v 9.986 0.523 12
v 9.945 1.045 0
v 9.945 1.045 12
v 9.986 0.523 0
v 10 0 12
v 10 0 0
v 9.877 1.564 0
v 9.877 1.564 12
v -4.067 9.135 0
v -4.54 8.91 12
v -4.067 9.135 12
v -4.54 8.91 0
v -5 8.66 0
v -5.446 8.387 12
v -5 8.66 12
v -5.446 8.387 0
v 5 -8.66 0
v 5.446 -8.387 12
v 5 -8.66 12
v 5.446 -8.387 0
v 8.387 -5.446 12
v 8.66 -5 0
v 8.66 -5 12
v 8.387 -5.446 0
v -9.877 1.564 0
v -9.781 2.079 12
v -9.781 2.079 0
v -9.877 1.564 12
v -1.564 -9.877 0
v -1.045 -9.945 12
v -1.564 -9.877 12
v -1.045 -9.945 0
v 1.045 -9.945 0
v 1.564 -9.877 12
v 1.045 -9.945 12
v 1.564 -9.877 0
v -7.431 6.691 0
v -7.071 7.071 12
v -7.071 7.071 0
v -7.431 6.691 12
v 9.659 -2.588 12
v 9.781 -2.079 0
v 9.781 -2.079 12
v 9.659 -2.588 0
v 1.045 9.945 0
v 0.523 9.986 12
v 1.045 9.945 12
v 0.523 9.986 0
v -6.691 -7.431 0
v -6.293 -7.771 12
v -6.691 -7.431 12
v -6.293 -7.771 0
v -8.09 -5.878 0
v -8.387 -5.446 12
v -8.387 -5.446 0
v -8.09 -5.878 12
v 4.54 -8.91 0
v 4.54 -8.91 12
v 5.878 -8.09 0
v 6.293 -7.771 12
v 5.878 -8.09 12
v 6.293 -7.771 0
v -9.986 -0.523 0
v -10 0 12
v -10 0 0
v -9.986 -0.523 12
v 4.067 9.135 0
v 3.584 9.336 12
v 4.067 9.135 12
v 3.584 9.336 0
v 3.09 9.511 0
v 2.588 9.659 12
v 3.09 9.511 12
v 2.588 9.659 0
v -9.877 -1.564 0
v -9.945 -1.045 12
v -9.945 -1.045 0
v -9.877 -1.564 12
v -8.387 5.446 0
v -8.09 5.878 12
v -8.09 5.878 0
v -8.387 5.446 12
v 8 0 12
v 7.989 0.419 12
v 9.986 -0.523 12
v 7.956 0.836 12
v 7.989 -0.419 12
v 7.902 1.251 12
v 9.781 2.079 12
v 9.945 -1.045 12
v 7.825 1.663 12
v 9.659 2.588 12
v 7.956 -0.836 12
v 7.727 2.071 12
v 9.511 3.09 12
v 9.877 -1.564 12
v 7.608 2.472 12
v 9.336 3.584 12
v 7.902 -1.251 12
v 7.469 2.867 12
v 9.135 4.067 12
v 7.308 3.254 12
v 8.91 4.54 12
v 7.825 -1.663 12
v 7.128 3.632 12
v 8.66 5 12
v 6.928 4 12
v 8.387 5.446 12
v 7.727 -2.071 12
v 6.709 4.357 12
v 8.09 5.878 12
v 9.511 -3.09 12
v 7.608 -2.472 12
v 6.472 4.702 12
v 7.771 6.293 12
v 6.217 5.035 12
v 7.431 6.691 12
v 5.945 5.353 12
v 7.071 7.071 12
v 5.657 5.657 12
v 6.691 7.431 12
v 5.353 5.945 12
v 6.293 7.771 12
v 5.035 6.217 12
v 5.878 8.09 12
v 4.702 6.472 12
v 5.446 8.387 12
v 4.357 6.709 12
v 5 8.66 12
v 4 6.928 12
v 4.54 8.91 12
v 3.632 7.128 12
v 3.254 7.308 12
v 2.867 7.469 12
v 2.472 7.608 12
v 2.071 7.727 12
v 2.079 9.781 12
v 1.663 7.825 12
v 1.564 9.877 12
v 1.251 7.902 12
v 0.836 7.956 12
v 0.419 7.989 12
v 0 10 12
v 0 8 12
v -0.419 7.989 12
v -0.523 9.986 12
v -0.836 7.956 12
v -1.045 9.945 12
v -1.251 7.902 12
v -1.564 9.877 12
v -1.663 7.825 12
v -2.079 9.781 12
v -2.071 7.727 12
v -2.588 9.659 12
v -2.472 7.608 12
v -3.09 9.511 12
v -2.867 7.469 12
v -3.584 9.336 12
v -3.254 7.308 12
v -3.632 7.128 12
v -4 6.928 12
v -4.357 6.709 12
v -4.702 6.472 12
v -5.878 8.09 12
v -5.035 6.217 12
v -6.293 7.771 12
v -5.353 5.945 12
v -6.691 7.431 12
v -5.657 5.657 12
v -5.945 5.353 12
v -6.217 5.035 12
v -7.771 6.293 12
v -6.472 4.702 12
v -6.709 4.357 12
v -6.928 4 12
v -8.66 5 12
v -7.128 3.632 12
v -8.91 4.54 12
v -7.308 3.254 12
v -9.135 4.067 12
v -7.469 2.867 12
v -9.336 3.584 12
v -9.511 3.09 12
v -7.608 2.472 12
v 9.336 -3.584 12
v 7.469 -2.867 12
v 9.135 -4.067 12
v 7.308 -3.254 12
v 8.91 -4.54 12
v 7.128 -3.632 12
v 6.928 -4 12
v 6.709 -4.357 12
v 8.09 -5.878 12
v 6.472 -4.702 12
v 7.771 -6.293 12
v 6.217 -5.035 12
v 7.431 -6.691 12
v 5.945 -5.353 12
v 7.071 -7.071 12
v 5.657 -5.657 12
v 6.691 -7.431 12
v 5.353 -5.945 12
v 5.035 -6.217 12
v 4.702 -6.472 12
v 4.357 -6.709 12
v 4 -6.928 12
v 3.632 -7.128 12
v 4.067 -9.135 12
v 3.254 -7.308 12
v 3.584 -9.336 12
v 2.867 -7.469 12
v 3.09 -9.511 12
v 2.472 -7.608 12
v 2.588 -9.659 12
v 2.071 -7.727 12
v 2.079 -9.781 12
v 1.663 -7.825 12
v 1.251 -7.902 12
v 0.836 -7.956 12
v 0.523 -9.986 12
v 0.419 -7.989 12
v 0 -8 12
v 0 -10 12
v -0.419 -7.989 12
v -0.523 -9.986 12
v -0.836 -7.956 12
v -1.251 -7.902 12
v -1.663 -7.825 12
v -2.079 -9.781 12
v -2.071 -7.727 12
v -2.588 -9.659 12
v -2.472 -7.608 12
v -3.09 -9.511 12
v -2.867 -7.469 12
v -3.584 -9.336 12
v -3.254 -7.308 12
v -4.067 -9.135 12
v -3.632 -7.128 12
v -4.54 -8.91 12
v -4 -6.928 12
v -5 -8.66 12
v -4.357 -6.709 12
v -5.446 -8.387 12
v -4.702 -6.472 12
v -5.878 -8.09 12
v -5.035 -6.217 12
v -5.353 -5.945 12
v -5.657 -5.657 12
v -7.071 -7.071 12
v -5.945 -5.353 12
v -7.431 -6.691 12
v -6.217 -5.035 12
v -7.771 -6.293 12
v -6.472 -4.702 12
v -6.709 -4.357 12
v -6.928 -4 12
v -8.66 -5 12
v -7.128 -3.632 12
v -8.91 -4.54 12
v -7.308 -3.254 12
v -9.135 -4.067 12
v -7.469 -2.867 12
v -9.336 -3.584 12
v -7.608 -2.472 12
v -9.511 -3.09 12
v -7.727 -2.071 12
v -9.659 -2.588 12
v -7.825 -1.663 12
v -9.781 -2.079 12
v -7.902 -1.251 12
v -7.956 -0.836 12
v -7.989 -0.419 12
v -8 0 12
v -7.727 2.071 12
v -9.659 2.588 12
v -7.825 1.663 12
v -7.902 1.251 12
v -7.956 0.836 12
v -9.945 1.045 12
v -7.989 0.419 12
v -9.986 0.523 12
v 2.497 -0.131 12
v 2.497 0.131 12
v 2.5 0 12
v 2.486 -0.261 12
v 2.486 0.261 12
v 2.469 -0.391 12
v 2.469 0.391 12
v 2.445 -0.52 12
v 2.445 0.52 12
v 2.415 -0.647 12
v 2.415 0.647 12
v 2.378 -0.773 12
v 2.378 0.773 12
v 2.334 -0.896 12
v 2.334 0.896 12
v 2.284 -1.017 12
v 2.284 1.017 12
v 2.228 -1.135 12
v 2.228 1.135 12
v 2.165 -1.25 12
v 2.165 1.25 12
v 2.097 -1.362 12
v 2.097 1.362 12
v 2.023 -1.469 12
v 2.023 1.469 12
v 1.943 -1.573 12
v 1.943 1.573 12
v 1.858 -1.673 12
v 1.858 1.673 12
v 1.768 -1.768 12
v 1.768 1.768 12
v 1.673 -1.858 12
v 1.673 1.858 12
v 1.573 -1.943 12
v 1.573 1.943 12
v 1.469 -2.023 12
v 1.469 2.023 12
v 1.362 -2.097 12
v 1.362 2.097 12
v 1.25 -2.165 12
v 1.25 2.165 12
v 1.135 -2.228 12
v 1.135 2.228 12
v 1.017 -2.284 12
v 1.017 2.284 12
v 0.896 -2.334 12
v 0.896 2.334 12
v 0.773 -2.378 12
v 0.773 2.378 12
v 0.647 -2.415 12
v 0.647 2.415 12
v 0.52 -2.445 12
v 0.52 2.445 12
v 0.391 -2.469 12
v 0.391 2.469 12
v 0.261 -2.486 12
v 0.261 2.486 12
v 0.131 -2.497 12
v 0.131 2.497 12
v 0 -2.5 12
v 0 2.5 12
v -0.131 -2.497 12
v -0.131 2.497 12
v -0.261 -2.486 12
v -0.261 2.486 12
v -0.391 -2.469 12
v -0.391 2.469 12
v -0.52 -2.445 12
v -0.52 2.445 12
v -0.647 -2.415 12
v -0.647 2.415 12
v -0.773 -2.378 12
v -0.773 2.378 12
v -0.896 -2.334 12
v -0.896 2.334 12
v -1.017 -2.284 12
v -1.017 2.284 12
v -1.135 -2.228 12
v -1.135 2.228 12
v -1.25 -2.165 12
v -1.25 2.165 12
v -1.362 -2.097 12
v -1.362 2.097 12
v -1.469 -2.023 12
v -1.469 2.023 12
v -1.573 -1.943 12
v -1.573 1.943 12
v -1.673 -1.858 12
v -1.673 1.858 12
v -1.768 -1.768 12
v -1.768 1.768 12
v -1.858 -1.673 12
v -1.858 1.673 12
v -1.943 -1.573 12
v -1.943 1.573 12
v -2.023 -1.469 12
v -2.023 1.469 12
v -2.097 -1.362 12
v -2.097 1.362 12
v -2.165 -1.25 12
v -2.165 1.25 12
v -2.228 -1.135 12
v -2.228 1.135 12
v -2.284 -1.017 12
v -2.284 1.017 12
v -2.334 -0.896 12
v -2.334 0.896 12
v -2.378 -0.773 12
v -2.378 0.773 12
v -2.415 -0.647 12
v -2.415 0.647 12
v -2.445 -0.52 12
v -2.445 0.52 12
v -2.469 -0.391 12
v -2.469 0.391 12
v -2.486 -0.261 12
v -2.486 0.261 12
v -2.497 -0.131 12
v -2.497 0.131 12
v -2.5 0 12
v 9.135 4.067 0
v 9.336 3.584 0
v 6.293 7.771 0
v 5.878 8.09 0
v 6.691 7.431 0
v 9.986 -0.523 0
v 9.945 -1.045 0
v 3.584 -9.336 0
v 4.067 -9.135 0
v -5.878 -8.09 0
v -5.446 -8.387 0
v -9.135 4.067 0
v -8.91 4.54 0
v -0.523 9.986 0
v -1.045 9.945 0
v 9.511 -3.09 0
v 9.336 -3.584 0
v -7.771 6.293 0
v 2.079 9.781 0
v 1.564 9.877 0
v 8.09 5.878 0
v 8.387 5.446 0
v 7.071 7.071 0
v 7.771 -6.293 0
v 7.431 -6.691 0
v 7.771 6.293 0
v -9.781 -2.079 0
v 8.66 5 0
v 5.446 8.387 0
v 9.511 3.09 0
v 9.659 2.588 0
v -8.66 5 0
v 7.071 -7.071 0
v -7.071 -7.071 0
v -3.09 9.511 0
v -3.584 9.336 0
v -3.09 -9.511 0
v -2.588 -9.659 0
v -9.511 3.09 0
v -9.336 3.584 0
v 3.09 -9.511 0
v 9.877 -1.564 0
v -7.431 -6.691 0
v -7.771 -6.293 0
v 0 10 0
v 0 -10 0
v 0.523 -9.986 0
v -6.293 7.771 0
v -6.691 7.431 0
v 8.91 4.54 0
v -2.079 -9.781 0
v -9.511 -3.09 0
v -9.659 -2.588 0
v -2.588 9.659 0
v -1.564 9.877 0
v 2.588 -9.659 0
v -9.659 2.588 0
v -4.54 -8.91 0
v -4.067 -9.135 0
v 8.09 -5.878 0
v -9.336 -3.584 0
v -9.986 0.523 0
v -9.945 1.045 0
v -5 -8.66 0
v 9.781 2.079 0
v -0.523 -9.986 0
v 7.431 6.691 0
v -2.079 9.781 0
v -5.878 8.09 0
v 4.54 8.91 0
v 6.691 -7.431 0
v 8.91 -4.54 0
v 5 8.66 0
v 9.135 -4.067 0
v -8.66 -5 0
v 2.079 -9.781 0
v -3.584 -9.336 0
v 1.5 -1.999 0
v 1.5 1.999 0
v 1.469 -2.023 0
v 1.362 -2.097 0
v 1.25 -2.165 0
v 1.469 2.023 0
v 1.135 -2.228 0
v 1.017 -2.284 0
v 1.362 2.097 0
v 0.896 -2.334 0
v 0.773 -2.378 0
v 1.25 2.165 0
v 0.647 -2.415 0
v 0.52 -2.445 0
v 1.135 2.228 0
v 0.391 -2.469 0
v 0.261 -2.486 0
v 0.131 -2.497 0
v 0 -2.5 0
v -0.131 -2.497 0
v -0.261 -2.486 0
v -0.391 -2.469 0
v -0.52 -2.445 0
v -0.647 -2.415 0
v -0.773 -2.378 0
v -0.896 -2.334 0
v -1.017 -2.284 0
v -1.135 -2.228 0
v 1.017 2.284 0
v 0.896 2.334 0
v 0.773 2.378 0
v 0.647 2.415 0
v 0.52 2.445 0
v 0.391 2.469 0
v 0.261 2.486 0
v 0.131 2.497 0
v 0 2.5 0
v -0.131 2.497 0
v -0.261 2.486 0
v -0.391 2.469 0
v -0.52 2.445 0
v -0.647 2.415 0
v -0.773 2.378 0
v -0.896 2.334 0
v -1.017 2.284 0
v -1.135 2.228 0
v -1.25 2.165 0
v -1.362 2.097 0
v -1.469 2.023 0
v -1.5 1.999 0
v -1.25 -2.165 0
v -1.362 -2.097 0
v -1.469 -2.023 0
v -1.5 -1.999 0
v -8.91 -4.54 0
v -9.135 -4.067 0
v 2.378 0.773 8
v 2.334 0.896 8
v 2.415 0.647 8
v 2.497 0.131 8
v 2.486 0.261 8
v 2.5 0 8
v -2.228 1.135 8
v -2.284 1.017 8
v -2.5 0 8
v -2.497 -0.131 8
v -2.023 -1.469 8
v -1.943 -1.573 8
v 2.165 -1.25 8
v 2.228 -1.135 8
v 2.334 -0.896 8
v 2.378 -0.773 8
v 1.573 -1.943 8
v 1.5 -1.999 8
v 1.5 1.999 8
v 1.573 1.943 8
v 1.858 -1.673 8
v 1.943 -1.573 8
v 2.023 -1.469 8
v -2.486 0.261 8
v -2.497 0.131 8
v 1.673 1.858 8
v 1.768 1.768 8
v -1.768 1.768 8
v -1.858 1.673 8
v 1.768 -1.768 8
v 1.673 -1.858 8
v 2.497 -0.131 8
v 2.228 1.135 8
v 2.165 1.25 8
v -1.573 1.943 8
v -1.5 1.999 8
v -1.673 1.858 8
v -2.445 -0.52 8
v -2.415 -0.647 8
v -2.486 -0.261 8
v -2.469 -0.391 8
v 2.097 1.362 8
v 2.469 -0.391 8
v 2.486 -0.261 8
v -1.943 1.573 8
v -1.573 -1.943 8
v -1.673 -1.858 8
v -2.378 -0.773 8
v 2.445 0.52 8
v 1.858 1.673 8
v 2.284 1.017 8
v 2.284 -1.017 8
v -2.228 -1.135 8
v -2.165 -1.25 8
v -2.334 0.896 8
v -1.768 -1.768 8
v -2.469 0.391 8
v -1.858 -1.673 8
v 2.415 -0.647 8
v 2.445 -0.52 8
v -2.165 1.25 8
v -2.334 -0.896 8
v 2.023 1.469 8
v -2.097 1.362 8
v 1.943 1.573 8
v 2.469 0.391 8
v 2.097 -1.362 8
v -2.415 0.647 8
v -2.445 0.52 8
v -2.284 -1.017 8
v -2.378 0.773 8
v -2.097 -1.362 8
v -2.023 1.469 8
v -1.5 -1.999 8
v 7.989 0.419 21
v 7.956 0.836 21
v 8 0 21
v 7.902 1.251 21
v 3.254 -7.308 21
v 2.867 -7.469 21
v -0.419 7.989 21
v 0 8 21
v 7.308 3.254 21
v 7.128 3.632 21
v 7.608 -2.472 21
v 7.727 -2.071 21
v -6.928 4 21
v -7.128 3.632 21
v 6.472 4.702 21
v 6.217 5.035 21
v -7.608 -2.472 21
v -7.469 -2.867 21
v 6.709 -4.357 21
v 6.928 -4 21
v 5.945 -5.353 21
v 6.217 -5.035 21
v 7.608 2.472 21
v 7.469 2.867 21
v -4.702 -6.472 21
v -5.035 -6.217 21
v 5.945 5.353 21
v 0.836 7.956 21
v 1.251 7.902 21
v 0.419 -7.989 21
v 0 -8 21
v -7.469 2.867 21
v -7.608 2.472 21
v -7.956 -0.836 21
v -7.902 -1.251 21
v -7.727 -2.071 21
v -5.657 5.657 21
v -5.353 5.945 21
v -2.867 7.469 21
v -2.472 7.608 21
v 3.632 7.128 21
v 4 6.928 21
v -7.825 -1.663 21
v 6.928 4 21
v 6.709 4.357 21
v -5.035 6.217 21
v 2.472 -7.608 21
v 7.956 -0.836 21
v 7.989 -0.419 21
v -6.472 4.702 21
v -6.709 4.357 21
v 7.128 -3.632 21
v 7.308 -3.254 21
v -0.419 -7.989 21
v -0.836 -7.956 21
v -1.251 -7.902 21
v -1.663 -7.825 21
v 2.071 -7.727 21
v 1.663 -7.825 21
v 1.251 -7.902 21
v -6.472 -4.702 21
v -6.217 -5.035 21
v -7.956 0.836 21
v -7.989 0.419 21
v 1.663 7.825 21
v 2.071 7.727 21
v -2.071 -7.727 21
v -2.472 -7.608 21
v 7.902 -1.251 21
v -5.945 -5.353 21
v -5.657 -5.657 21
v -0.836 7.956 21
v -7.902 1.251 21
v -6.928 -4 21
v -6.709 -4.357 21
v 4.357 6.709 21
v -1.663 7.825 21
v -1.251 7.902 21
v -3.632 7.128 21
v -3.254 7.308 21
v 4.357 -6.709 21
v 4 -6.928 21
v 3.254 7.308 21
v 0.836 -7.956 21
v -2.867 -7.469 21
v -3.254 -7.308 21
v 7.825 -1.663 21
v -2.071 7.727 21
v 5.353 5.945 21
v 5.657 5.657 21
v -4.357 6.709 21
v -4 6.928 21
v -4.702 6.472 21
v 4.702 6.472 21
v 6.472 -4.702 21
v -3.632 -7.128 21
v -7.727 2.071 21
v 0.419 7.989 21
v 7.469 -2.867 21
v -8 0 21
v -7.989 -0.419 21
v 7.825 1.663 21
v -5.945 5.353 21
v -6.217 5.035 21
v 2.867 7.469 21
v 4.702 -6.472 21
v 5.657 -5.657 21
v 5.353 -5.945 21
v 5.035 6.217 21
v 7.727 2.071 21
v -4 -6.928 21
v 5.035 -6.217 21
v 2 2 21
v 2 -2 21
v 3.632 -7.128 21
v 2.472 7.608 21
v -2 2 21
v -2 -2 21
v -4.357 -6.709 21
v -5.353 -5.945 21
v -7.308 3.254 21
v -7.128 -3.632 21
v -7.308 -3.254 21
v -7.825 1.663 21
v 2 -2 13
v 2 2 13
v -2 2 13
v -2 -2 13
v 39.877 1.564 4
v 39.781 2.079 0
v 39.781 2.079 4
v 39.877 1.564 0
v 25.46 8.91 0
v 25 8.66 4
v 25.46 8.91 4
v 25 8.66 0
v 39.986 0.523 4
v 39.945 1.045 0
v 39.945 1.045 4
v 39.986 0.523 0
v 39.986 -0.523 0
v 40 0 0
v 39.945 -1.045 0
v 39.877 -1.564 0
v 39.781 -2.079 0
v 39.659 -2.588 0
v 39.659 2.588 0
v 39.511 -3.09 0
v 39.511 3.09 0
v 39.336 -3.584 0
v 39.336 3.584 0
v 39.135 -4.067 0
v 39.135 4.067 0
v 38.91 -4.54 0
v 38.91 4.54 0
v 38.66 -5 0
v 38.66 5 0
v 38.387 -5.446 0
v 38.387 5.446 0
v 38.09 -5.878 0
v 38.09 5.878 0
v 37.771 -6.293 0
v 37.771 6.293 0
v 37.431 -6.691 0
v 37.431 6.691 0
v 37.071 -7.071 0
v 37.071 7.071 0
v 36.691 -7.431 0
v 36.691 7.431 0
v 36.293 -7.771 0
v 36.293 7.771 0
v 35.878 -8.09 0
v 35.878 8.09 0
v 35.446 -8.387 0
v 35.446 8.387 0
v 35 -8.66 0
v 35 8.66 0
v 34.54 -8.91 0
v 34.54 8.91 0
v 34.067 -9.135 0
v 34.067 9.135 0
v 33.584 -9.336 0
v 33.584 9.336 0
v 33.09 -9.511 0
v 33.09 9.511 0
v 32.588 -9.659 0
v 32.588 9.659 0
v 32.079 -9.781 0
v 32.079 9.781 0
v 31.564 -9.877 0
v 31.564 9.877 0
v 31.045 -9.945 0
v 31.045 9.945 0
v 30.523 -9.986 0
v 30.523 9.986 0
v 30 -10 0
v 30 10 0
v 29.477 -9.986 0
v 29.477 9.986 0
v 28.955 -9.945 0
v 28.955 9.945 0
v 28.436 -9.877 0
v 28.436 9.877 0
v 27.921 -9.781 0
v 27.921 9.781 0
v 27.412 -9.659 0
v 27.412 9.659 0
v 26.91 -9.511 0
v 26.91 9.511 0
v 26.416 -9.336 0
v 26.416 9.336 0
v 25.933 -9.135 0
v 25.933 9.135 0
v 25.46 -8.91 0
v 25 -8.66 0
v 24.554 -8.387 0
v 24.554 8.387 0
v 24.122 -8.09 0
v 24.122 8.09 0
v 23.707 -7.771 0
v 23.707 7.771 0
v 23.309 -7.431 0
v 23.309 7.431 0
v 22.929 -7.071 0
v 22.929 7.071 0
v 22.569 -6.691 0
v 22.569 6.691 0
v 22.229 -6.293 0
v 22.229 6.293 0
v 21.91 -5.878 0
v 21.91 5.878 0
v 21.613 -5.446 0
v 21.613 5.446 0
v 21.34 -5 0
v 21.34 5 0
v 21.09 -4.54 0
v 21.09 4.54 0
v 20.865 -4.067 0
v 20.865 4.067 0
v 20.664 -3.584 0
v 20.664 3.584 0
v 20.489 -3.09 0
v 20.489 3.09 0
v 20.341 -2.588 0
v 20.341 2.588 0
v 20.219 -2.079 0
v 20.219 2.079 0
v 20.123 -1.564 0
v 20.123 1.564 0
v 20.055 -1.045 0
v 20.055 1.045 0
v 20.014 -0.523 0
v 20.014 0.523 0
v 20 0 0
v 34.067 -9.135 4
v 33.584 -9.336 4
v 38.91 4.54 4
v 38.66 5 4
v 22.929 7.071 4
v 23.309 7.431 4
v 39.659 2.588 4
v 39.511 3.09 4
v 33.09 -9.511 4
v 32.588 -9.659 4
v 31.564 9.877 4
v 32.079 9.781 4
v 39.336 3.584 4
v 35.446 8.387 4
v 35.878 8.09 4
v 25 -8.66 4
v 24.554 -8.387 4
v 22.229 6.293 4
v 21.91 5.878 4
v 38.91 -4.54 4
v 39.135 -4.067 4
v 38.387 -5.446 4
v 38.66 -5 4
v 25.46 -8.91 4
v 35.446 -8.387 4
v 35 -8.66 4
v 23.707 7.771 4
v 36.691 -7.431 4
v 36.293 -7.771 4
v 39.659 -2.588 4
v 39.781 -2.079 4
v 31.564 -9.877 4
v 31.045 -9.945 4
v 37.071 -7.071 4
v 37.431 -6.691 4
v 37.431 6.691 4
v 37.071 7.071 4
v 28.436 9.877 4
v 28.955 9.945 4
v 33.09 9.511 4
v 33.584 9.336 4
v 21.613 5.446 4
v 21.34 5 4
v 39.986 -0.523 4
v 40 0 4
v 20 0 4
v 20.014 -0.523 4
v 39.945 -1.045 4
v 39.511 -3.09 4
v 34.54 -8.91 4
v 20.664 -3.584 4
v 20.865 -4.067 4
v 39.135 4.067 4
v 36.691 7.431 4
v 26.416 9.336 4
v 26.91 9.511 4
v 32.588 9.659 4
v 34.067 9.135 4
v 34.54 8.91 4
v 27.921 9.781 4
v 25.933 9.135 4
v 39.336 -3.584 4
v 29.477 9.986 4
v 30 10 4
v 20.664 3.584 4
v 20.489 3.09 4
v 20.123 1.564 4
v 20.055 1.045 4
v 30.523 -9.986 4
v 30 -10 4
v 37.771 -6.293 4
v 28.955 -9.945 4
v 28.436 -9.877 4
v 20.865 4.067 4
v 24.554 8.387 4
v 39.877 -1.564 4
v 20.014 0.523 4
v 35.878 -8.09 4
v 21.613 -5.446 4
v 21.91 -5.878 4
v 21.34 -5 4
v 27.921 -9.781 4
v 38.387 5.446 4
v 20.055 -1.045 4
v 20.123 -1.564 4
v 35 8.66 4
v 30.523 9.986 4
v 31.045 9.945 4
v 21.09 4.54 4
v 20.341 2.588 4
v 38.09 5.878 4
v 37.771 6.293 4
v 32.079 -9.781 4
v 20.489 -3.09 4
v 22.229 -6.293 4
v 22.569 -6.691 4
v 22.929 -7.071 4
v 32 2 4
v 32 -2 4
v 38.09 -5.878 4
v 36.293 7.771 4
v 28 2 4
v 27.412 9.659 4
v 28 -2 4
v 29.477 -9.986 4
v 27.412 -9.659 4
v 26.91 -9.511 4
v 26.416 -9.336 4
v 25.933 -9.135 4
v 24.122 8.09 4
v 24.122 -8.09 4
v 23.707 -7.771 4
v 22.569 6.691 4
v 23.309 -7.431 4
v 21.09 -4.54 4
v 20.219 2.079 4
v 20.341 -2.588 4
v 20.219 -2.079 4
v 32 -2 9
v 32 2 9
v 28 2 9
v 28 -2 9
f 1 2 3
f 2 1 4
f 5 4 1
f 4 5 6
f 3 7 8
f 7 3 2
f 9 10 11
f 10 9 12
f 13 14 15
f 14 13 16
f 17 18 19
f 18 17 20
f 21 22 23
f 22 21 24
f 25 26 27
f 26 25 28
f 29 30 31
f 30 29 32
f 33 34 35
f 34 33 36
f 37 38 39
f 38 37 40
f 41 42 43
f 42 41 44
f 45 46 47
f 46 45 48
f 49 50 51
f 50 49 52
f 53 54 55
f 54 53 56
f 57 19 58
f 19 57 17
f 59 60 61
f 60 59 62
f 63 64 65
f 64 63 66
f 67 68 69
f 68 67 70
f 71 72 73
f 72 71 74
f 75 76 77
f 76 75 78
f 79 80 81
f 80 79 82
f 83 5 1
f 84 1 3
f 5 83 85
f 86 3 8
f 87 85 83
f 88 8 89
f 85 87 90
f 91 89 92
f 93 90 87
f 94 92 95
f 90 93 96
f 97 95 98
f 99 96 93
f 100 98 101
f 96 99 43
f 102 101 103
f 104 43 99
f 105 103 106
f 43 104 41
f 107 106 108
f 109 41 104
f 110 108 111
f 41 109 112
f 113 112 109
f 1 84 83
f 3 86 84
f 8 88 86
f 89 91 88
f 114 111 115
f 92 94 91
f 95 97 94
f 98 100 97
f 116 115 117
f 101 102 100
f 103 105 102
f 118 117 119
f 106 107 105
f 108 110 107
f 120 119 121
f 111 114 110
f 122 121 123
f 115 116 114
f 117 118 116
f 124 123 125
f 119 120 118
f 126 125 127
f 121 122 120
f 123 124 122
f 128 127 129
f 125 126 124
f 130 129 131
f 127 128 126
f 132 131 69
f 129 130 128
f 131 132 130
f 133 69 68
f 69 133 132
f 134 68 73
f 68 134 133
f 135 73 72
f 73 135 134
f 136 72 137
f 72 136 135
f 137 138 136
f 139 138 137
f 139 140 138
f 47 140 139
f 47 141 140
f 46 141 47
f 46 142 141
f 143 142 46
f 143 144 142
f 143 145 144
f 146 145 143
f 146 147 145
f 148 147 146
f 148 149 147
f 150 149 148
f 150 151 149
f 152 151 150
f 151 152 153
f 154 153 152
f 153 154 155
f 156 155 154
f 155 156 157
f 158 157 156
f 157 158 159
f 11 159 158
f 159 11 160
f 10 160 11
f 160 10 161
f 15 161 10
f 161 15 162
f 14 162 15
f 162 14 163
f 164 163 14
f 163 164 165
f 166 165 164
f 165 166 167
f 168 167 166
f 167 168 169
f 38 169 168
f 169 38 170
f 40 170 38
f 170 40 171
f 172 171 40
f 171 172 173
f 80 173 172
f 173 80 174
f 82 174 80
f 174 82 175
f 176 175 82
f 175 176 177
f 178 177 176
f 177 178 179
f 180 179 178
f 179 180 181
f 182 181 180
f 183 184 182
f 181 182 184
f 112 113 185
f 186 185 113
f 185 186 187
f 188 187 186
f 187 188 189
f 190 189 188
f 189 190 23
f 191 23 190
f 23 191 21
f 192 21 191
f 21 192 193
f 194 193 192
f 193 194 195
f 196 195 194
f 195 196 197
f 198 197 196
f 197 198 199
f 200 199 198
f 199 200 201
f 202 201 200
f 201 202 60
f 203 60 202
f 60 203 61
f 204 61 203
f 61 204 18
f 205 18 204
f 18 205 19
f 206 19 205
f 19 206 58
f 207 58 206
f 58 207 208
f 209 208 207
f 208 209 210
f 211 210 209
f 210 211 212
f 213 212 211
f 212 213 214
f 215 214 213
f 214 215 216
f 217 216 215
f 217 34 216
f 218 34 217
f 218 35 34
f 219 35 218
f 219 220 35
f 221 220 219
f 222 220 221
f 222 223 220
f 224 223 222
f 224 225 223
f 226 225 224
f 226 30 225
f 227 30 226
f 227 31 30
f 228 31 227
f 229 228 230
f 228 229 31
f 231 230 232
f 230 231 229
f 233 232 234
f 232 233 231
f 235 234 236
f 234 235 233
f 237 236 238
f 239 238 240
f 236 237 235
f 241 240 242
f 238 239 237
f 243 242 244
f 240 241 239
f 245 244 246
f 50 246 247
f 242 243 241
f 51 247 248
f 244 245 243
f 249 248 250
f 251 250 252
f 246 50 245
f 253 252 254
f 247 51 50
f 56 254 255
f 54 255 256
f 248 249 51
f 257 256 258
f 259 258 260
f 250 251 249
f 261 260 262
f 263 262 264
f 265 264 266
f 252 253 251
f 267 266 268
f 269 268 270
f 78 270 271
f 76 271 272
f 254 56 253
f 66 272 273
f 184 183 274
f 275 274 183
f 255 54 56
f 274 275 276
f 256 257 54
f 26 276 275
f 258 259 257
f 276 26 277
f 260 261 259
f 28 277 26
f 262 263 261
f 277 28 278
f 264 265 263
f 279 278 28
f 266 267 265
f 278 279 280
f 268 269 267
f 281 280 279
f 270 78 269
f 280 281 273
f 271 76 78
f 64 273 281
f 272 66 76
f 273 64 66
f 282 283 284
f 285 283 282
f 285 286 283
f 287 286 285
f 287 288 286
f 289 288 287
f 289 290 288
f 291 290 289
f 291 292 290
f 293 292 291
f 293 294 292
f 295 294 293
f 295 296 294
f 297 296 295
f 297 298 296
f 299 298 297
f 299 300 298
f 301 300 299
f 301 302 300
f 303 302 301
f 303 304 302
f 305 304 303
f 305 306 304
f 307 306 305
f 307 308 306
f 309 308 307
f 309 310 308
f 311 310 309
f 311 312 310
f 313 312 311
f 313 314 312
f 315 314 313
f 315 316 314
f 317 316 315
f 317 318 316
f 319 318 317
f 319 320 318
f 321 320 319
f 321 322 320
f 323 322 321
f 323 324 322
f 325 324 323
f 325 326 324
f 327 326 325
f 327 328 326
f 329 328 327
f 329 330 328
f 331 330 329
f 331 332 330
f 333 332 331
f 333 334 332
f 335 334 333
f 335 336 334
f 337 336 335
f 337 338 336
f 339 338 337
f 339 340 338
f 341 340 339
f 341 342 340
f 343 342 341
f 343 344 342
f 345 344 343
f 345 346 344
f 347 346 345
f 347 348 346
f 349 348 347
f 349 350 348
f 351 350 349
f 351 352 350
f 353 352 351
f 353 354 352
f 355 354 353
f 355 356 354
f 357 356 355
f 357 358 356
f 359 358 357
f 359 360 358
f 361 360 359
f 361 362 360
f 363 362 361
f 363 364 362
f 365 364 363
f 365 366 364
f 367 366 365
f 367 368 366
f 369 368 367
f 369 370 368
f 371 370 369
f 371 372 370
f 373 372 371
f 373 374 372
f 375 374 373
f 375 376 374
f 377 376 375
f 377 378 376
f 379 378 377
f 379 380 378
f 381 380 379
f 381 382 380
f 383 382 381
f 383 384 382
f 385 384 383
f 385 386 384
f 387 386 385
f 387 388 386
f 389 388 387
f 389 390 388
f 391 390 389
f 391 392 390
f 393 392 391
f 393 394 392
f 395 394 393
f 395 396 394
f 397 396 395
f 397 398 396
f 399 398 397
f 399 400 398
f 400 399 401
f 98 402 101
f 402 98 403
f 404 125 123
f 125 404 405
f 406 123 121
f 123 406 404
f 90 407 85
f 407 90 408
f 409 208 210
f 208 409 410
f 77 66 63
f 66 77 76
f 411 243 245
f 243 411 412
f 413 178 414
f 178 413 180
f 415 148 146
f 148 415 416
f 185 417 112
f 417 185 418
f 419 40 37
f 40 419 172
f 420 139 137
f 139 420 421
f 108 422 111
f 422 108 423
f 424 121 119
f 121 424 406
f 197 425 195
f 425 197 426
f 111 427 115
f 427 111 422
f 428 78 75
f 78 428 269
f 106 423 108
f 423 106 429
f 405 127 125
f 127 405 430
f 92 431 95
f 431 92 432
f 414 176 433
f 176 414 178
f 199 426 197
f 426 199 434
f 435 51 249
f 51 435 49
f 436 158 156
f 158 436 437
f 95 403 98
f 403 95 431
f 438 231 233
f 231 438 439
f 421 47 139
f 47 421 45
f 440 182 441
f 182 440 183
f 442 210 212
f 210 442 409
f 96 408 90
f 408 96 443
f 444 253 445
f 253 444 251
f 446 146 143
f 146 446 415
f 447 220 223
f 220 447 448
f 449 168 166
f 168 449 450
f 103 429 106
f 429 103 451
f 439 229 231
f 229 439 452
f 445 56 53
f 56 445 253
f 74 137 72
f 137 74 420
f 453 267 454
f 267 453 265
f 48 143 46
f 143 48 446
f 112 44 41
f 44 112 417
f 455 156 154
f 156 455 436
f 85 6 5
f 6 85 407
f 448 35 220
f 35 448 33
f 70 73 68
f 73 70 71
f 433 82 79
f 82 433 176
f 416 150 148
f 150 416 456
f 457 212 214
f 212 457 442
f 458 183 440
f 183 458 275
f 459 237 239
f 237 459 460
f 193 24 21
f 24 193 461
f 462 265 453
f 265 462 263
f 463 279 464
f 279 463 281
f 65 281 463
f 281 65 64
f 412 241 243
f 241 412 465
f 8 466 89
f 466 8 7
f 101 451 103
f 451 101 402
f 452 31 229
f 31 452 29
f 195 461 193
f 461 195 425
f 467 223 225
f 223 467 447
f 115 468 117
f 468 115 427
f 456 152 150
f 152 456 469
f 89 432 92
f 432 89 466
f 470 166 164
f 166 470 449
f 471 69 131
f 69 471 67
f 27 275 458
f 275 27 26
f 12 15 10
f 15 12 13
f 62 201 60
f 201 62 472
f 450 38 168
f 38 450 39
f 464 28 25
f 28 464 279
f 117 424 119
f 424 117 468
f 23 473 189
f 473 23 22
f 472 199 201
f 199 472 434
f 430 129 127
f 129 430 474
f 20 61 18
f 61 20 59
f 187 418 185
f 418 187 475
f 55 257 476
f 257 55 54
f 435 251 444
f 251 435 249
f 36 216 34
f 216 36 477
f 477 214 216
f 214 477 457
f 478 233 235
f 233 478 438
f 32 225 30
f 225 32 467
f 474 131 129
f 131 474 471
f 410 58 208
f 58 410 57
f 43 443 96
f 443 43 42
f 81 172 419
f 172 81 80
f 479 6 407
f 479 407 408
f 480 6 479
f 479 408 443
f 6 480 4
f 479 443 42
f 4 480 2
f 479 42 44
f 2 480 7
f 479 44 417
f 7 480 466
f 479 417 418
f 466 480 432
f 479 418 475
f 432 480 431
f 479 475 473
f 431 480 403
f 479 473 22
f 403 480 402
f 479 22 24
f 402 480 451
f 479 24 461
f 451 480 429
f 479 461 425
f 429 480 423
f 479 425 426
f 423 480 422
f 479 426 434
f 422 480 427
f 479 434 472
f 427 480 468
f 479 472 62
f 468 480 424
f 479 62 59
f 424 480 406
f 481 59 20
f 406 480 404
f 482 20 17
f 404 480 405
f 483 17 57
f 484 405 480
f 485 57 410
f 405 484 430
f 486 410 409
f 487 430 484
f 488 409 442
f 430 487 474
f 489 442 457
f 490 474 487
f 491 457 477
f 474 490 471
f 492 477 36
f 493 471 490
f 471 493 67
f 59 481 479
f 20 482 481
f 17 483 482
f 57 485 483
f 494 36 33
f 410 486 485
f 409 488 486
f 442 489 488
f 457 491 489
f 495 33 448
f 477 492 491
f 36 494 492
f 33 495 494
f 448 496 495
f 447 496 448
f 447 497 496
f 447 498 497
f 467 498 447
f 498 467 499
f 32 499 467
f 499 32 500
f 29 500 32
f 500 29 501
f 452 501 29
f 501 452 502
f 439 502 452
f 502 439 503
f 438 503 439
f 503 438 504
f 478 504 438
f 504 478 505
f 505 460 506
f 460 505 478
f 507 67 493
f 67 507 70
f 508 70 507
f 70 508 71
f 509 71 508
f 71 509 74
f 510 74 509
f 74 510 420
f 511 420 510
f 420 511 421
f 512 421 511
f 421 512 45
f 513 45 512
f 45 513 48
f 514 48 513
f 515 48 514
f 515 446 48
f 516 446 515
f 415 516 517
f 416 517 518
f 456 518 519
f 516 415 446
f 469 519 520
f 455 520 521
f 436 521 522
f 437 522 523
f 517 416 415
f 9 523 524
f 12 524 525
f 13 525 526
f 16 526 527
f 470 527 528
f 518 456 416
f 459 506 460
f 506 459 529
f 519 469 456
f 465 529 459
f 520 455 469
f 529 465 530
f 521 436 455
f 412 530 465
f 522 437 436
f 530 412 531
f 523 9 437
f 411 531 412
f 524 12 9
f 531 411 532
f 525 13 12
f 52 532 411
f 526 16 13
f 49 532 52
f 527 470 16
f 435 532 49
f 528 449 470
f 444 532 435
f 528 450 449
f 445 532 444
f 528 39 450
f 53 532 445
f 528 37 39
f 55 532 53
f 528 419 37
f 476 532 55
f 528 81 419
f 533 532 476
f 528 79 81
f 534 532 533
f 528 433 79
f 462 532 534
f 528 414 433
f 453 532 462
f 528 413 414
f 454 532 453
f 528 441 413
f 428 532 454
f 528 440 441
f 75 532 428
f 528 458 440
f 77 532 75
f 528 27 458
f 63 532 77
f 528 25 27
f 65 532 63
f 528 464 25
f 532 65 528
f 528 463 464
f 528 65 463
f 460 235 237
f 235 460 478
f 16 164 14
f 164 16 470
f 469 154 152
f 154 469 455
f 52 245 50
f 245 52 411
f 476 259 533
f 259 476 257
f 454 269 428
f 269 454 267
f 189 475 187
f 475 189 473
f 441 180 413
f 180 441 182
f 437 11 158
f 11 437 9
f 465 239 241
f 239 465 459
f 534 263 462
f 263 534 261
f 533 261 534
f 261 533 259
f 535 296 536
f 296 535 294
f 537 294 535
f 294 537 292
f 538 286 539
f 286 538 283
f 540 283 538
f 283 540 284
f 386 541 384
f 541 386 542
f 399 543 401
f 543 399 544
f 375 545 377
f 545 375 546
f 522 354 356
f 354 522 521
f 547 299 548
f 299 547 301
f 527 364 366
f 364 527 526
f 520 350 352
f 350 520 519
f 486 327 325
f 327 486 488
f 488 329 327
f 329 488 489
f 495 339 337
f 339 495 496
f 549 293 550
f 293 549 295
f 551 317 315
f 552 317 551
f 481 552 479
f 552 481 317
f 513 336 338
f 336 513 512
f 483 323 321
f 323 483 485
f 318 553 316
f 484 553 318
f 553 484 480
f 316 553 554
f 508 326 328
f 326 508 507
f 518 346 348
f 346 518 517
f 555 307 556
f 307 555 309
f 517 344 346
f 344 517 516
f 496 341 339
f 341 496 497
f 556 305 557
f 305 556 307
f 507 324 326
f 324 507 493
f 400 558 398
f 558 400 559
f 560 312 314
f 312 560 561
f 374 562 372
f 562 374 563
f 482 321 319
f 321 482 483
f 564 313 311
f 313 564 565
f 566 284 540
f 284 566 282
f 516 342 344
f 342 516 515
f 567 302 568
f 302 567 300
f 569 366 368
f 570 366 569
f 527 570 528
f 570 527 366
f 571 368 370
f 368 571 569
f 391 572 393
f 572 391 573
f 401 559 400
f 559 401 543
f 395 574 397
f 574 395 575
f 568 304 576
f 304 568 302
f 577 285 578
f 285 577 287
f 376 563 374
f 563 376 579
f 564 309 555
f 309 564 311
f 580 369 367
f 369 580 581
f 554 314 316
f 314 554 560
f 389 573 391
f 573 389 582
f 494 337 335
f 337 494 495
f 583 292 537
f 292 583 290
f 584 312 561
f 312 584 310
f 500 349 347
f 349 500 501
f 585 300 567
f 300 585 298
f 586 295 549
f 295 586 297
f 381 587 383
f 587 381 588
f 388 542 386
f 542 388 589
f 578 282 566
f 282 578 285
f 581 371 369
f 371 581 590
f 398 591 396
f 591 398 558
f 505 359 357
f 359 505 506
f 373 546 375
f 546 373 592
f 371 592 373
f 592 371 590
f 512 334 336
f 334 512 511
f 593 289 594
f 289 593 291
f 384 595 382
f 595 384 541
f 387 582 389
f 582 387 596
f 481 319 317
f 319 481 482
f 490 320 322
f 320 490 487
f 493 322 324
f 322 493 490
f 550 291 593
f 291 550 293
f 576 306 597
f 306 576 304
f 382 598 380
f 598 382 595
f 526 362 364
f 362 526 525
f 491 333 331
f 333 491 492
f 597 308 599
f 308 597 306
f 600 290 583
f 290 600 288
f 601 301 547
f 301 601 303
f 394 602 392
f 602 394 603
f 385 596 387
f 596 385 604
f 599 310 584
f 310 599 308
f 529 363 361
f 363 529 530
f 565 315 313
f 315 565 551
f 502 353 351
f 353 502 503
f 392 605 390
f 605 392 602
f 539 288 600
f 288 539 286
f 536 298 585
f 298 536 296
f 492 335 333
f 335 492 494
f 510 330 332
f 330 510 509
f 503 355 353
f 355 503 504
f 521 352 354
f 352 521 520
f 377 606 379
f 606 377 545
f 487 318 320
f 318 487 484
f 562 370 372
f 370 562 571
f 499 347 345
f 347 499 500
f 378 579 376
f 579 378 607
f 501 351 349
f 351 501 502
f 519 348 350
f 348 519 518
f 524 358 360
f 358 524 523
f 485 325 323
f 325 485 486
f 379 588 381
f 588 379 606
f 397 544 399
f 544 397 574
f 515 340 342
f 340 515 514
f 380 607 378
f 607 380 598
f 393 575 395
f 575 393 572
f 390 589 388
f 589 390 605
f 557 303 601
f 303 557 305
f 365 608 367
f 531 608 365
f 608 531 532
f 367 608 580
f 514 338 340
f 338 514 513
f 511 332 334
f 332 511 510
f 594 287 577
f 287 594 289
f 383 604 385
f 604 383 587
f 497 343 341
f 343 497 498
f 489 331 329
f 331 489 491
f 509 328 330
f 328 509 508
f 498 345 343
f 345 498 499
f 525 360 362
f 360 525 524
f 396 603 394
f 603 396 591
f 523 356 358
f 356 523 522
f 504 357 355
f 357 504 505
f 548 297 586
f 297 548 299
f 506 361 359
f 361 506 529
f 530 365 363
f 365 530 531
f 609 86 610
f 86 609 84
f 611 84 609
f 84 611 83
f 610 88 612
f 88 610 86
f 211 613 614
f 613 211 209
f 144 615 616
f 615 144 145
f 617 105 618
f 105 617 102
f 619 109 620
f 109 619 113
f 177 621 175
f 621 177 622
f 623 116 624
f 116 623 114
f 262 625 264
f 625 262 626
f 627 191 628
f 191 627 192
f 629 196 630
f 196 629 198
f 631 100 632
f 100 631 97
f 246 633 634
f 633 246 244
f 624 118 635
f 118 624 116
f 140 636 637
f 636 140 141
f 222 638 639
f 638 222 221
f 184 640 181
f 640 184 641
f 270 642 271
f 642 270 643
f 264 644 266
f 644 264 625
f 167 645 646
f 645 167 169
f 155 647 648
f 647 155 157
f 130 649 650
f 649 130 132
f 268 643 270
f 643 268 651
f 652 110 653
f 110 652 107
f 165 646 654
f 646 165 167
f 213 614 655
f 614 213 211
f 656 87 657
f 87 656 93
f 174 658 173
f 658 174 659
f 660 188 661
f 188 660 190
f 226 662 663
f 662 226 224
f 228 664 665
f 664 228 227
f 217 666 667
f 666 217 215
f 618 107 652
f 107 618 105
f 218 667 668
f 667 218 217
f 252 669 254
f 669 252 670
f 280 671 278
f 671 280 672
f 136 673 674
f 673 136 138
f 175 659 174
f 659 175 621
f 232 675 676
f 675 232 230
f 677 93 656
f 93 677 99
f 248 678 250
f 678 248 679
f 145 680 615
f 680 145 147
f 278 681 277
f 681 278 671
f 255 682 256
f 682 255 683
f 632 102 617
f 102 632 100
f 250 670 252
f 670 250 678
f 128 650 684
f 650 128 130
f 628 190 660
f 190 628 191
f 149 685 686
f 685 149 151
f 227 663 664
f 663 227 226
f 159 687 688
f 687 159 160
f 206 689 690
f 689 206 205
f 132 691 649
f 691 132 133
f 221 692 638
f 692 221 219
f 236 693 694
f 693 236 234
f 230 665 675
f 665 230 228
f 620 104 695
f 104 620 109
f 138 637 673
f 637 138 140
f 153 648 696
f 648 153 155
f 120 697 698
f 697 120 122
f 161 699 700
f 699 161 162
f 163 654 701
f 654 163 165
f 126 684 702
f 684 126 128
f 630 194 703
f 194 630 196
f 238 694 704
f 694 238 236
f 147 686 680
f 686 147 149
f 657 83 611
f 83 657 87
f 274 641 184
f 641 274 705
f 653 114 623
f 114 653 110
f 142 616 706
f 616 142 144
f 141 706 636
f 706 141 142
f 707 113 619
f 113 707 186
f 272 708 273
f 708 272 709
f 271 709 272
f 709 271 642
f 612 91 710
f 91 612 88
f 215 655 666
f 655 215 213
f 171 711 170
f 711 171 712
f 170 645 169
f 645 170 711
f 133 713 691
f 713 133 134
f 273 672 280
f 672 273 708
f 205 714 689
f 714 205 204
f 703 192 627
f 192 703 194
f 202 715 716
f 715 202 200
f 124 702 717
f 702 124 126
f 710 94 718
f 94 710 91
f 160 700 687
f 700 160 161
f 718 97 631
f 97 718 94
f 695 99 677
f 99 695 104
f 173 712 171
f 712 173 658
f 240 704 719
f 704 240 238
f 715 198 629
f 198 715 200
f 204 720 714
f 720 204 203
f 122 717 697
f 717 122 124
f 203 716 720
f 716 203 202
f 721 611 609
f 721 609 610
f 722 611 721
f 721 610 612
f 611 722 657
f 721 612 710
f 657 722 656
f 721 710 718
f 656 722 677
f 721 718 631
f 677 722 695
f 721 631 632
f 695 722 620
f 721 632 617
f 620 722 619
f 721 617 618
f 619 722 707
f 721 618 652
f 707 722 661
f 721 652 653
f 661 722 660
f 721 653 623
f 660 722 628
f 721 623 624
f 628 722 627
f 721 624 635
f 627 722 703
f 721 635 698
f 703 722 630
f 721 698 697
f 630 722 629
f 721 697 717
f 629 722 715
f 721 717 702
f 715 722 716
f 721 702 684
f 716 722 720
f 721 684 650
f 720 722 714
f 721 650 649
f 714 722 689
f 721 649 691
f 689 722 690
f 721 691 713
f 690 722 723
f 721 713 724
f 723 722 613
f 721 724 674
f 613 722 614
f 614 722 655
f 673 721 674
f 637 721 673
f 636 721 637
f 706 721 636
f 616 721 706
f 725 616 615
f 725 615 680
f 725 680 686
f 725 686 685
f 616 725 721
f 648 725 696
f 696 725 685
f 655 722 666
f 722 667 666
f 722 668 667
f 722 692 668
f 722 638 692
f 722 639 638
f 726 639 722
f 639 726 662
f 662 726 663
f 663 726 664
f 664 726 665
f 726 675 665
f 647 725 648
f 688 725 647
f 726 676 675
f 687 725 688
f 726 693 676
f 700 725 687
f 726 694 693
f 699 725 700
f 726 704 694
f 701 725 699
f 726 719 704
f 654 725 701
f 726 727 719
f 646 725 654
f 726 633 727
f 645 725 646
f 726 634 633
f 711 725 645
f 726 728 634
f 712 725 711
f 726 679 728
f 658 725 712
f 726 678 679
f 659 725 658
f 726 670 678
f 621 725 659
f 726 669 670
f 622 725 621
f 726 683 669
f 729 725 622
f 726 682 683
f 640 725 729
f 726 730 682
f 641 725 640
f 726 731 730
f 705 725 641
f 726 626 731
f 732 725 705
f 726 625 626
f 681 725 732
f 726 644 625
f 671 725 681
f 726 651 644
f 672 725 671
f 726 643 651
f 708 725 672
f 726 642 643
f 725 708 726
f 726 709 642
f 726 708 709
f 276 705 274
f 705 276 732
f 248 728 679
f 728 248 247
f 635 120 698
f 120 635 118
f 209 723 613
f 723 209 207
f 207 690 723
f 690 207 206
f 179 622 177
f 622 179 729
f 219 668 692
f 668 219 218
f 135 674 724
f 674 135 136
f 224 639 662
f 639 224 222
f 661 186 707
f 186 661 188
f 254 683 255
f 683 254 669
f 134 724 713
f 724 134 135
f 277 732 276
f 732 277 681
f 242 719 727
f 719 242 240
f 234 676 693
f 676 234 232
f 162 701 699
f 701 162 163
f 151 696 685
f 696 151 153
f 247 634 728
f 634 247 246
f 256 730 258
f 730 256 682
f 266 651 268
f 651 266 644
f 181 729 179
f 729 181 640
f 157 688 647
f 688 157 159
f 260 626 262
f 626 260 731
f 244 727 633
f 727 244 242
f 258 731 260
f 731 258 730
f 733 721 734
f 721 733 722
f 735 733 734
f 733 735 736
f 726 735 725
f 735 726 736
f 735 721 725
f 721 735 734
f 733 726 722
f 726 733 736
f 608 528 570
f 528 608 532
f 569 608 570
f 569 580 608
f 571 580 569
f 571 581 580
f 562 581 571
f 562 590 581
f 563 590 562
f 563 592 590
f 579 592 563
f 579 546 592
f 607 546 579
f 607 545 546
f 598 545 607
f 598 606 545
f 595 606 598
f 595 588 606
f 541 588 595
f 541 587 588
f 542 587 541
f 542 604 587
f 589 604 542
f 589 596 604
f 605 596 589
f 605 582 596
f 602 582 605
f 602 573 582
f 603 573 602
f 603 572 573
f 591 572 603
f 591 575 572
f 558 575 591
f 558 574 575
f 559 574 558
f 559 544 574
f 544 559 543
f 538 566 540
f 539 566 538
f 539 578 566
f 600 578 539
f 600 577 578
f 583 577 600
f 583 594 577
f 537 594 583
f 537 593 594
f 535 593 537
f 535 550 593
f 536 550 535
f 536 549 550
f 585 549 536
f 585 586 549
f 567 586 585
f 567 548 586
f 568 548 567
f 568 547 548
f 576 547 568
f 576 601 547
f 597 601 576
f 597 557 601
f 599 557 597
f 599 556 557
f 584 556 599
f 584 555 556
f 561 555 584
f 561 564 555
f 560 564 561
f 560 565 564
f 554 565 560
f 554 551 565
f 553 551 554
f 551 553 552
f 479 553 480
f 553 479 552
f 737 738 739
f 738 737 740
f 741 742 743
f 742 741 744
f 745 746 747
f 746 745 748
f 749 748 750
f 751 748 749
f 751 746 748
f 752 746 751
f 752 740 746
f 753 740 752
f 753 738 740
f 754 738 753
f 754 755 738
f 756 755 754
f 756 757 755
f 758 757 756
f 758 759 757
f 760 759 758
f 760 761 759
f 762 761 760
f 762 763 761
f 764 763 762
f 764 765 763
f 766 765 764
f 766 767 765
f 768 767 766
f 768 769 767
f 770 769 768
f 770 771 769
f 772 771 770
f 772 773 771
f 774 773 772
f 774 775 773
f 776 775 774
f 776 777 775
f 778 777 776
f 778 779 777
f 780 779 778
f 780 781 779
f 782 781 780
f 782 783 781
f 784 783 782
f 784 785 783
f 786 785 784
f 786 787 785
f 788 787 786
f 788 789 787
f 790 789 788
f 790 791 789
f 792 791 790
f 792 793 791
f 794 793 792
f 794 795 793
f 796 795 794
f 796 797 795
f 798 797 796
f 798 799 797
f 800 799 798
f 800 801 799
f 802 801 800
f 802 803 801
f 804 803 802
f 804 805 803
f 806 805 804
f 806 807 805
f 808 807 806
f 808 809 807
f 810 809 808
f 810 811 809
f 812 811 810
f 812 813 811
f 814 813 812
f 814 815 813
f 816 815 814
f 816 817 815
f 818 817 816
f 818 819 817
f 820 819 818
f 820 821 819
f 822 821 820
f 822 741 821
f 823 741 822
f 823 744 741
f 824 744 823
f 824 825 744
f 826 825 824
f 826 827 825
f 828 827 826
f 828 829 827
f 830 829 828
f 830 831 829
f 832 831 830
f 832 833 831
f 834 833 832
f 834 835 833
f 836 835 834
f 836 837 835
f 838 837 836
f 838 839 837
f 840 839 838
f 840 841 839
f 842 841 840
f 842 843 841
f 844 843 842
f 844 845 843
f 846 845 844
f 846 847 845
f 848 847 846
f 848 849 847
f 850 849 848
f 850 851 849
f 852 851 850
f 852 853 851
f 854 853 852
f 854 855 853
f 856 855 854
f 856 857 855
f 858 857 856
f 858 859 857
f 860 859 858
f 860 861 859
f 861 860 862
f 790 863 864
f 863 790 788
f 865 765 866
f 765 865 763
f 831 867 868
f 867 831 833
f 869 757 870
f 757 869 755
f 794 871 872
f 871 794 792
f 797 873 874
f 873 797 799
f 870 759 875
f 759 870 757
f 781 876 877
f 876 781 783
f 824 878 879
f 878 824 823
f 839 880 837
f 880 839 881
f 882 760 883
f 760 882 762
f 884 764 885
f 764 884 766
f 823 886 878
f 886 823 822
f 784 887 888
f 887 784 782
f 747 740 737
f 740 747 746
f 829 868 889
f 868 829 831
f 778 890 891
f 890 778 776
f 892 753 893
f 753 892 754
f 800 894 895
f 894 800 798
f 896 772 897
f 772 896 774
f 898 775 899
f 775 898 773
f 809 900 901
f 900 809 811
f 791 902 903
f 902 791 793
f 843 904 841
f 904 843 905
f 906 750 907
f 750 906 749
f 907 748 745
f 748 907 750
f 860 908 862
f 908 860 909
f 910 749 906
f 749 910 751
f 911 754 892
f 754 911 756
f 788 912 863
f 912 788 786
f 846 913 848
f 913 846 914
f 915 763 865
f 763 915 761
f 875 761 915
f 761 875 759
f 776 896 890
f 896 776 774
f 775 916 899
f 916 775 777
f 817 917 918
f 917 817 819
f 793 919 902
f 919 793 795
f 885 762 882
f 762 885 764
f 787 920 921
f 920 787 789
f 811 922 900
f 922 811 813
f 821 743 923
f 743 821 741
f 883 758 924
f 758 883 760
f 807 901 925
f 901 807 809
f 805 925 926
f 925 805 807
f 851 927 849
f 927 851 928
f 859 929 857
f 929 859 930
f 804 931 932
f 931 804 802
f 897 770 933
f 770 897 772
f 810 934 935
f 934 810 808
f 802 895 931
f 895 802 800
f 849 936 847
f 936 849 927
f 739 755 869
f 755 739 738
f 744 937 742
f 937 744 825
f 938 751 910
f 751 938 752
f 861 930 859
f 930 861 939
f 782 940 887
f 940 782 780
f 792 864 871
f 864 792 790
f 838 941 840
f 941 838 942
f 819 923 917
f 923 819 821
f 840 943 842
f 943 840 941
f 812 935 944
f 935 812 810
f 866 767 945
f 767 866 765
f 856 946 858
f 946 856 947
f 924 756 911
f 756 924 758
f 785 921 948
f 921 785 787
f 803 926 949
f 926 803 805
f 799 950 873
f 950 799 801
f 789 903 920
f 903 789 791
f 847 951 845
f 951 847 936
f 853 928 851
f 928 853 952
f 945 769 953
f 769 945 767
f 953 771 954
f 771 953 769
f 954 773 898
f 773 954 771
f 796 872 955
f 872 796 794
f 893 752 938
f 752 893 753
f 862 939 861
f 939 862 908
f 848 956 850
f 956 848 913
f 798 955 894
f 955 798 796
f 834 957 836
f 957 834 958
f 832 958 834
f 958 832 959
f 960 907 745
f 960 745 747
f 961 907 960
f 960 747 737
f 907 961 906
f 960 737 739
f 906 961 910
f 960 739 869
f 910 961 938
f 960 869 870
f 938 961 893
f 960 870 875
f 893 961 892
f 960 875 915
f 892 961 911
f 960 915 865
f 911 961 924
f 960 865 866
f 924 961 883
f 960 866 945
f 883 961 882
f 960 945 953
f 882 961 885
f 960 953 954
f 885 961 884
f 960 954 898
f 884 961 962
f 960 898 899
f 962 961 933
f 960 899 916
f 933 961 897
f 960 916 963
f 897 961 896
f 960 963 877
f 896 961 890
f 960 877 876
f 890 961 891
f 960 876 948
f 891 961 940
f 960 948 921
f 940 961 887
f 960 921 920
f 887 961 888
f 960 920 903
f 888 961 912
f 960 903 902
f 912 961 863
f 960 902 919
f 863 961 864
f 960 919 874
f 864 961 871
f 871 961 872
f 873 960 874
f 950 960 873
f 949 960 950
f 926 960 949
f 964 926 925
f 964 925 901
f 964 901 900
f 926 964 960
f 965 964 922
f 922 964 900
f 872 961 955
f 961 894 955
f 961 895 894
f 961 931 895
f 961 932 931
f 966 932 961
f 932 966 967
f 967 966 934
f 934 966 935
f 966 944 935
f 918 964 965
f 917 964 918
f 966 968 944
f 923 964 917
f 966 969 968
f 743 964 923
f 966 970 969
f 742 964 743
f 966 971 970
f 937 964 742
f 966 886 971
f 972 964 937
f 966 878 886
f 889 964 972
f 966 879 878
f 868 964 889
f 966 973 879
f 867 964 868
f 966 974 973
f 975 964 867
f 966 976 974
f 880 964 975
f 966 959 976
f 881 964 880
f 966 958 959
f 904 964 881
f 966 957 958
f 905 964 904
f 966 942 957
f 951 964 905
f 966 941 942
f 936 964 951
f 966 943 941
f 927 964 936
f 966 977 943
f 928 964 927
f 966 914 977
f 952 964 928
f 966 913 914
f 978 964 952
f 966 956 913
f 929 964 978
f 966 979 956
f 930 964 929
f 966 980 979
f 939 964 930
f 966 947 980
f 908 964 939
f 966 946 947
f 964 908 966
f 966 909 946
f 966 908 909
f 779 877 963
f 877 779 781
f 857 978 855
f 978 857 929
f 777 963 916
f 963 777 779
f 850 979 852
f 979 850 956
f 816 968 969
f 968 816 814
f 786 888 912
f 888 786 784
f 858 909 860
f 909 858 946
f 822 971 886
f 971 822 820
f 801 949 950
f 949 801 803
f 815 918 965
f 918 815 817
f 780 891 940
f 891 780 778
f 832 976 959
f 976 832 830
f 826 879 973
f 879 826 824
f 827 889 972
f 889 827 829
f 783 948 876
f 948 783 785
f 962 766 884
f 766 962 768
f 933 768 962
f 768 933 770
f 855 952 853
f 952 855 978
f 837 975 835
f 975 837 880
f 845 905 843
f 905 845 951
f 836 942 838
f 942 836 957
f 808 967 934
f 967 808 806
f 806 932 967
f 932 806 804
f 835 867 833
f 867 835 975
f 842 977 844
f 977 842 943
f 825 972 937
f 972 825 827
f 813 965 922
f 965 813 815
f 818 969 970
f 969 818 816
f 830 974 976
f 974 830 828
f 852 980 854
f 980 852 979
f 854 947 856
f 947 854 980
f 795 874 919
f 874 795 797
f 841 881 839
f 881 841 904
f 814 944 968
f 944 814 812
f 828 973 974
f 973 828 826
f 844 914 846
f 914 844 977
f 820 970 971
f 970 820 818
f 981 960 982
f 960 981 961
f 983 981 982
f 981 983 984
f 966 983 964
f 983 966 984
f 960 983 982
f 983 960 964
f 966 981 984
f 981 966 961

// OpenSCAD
$fn=120;
spindle_traction();
translate([30,0,0])
spindle_top();
module spindle_traction() {
        difference () {
            cylinder(d=20,h=12);
            cylinder(d=5,h=12);
        }
        translate([0,0,12])
        difference(){
            cylinder(d=16,h=9);
            translate([-2,-2,1])
            #cube([4,4,8]);
        }
        translate([-4,-3,0])cube([2.5, 6, 8]);    
        translate([1.5,-3,0])cube([2.5,6, 8]);
       
}
module spindle_top() {
    cylinder(d=20,h=4);
    translate([-2,-2,2])
    cube([4,4,7]);
}
